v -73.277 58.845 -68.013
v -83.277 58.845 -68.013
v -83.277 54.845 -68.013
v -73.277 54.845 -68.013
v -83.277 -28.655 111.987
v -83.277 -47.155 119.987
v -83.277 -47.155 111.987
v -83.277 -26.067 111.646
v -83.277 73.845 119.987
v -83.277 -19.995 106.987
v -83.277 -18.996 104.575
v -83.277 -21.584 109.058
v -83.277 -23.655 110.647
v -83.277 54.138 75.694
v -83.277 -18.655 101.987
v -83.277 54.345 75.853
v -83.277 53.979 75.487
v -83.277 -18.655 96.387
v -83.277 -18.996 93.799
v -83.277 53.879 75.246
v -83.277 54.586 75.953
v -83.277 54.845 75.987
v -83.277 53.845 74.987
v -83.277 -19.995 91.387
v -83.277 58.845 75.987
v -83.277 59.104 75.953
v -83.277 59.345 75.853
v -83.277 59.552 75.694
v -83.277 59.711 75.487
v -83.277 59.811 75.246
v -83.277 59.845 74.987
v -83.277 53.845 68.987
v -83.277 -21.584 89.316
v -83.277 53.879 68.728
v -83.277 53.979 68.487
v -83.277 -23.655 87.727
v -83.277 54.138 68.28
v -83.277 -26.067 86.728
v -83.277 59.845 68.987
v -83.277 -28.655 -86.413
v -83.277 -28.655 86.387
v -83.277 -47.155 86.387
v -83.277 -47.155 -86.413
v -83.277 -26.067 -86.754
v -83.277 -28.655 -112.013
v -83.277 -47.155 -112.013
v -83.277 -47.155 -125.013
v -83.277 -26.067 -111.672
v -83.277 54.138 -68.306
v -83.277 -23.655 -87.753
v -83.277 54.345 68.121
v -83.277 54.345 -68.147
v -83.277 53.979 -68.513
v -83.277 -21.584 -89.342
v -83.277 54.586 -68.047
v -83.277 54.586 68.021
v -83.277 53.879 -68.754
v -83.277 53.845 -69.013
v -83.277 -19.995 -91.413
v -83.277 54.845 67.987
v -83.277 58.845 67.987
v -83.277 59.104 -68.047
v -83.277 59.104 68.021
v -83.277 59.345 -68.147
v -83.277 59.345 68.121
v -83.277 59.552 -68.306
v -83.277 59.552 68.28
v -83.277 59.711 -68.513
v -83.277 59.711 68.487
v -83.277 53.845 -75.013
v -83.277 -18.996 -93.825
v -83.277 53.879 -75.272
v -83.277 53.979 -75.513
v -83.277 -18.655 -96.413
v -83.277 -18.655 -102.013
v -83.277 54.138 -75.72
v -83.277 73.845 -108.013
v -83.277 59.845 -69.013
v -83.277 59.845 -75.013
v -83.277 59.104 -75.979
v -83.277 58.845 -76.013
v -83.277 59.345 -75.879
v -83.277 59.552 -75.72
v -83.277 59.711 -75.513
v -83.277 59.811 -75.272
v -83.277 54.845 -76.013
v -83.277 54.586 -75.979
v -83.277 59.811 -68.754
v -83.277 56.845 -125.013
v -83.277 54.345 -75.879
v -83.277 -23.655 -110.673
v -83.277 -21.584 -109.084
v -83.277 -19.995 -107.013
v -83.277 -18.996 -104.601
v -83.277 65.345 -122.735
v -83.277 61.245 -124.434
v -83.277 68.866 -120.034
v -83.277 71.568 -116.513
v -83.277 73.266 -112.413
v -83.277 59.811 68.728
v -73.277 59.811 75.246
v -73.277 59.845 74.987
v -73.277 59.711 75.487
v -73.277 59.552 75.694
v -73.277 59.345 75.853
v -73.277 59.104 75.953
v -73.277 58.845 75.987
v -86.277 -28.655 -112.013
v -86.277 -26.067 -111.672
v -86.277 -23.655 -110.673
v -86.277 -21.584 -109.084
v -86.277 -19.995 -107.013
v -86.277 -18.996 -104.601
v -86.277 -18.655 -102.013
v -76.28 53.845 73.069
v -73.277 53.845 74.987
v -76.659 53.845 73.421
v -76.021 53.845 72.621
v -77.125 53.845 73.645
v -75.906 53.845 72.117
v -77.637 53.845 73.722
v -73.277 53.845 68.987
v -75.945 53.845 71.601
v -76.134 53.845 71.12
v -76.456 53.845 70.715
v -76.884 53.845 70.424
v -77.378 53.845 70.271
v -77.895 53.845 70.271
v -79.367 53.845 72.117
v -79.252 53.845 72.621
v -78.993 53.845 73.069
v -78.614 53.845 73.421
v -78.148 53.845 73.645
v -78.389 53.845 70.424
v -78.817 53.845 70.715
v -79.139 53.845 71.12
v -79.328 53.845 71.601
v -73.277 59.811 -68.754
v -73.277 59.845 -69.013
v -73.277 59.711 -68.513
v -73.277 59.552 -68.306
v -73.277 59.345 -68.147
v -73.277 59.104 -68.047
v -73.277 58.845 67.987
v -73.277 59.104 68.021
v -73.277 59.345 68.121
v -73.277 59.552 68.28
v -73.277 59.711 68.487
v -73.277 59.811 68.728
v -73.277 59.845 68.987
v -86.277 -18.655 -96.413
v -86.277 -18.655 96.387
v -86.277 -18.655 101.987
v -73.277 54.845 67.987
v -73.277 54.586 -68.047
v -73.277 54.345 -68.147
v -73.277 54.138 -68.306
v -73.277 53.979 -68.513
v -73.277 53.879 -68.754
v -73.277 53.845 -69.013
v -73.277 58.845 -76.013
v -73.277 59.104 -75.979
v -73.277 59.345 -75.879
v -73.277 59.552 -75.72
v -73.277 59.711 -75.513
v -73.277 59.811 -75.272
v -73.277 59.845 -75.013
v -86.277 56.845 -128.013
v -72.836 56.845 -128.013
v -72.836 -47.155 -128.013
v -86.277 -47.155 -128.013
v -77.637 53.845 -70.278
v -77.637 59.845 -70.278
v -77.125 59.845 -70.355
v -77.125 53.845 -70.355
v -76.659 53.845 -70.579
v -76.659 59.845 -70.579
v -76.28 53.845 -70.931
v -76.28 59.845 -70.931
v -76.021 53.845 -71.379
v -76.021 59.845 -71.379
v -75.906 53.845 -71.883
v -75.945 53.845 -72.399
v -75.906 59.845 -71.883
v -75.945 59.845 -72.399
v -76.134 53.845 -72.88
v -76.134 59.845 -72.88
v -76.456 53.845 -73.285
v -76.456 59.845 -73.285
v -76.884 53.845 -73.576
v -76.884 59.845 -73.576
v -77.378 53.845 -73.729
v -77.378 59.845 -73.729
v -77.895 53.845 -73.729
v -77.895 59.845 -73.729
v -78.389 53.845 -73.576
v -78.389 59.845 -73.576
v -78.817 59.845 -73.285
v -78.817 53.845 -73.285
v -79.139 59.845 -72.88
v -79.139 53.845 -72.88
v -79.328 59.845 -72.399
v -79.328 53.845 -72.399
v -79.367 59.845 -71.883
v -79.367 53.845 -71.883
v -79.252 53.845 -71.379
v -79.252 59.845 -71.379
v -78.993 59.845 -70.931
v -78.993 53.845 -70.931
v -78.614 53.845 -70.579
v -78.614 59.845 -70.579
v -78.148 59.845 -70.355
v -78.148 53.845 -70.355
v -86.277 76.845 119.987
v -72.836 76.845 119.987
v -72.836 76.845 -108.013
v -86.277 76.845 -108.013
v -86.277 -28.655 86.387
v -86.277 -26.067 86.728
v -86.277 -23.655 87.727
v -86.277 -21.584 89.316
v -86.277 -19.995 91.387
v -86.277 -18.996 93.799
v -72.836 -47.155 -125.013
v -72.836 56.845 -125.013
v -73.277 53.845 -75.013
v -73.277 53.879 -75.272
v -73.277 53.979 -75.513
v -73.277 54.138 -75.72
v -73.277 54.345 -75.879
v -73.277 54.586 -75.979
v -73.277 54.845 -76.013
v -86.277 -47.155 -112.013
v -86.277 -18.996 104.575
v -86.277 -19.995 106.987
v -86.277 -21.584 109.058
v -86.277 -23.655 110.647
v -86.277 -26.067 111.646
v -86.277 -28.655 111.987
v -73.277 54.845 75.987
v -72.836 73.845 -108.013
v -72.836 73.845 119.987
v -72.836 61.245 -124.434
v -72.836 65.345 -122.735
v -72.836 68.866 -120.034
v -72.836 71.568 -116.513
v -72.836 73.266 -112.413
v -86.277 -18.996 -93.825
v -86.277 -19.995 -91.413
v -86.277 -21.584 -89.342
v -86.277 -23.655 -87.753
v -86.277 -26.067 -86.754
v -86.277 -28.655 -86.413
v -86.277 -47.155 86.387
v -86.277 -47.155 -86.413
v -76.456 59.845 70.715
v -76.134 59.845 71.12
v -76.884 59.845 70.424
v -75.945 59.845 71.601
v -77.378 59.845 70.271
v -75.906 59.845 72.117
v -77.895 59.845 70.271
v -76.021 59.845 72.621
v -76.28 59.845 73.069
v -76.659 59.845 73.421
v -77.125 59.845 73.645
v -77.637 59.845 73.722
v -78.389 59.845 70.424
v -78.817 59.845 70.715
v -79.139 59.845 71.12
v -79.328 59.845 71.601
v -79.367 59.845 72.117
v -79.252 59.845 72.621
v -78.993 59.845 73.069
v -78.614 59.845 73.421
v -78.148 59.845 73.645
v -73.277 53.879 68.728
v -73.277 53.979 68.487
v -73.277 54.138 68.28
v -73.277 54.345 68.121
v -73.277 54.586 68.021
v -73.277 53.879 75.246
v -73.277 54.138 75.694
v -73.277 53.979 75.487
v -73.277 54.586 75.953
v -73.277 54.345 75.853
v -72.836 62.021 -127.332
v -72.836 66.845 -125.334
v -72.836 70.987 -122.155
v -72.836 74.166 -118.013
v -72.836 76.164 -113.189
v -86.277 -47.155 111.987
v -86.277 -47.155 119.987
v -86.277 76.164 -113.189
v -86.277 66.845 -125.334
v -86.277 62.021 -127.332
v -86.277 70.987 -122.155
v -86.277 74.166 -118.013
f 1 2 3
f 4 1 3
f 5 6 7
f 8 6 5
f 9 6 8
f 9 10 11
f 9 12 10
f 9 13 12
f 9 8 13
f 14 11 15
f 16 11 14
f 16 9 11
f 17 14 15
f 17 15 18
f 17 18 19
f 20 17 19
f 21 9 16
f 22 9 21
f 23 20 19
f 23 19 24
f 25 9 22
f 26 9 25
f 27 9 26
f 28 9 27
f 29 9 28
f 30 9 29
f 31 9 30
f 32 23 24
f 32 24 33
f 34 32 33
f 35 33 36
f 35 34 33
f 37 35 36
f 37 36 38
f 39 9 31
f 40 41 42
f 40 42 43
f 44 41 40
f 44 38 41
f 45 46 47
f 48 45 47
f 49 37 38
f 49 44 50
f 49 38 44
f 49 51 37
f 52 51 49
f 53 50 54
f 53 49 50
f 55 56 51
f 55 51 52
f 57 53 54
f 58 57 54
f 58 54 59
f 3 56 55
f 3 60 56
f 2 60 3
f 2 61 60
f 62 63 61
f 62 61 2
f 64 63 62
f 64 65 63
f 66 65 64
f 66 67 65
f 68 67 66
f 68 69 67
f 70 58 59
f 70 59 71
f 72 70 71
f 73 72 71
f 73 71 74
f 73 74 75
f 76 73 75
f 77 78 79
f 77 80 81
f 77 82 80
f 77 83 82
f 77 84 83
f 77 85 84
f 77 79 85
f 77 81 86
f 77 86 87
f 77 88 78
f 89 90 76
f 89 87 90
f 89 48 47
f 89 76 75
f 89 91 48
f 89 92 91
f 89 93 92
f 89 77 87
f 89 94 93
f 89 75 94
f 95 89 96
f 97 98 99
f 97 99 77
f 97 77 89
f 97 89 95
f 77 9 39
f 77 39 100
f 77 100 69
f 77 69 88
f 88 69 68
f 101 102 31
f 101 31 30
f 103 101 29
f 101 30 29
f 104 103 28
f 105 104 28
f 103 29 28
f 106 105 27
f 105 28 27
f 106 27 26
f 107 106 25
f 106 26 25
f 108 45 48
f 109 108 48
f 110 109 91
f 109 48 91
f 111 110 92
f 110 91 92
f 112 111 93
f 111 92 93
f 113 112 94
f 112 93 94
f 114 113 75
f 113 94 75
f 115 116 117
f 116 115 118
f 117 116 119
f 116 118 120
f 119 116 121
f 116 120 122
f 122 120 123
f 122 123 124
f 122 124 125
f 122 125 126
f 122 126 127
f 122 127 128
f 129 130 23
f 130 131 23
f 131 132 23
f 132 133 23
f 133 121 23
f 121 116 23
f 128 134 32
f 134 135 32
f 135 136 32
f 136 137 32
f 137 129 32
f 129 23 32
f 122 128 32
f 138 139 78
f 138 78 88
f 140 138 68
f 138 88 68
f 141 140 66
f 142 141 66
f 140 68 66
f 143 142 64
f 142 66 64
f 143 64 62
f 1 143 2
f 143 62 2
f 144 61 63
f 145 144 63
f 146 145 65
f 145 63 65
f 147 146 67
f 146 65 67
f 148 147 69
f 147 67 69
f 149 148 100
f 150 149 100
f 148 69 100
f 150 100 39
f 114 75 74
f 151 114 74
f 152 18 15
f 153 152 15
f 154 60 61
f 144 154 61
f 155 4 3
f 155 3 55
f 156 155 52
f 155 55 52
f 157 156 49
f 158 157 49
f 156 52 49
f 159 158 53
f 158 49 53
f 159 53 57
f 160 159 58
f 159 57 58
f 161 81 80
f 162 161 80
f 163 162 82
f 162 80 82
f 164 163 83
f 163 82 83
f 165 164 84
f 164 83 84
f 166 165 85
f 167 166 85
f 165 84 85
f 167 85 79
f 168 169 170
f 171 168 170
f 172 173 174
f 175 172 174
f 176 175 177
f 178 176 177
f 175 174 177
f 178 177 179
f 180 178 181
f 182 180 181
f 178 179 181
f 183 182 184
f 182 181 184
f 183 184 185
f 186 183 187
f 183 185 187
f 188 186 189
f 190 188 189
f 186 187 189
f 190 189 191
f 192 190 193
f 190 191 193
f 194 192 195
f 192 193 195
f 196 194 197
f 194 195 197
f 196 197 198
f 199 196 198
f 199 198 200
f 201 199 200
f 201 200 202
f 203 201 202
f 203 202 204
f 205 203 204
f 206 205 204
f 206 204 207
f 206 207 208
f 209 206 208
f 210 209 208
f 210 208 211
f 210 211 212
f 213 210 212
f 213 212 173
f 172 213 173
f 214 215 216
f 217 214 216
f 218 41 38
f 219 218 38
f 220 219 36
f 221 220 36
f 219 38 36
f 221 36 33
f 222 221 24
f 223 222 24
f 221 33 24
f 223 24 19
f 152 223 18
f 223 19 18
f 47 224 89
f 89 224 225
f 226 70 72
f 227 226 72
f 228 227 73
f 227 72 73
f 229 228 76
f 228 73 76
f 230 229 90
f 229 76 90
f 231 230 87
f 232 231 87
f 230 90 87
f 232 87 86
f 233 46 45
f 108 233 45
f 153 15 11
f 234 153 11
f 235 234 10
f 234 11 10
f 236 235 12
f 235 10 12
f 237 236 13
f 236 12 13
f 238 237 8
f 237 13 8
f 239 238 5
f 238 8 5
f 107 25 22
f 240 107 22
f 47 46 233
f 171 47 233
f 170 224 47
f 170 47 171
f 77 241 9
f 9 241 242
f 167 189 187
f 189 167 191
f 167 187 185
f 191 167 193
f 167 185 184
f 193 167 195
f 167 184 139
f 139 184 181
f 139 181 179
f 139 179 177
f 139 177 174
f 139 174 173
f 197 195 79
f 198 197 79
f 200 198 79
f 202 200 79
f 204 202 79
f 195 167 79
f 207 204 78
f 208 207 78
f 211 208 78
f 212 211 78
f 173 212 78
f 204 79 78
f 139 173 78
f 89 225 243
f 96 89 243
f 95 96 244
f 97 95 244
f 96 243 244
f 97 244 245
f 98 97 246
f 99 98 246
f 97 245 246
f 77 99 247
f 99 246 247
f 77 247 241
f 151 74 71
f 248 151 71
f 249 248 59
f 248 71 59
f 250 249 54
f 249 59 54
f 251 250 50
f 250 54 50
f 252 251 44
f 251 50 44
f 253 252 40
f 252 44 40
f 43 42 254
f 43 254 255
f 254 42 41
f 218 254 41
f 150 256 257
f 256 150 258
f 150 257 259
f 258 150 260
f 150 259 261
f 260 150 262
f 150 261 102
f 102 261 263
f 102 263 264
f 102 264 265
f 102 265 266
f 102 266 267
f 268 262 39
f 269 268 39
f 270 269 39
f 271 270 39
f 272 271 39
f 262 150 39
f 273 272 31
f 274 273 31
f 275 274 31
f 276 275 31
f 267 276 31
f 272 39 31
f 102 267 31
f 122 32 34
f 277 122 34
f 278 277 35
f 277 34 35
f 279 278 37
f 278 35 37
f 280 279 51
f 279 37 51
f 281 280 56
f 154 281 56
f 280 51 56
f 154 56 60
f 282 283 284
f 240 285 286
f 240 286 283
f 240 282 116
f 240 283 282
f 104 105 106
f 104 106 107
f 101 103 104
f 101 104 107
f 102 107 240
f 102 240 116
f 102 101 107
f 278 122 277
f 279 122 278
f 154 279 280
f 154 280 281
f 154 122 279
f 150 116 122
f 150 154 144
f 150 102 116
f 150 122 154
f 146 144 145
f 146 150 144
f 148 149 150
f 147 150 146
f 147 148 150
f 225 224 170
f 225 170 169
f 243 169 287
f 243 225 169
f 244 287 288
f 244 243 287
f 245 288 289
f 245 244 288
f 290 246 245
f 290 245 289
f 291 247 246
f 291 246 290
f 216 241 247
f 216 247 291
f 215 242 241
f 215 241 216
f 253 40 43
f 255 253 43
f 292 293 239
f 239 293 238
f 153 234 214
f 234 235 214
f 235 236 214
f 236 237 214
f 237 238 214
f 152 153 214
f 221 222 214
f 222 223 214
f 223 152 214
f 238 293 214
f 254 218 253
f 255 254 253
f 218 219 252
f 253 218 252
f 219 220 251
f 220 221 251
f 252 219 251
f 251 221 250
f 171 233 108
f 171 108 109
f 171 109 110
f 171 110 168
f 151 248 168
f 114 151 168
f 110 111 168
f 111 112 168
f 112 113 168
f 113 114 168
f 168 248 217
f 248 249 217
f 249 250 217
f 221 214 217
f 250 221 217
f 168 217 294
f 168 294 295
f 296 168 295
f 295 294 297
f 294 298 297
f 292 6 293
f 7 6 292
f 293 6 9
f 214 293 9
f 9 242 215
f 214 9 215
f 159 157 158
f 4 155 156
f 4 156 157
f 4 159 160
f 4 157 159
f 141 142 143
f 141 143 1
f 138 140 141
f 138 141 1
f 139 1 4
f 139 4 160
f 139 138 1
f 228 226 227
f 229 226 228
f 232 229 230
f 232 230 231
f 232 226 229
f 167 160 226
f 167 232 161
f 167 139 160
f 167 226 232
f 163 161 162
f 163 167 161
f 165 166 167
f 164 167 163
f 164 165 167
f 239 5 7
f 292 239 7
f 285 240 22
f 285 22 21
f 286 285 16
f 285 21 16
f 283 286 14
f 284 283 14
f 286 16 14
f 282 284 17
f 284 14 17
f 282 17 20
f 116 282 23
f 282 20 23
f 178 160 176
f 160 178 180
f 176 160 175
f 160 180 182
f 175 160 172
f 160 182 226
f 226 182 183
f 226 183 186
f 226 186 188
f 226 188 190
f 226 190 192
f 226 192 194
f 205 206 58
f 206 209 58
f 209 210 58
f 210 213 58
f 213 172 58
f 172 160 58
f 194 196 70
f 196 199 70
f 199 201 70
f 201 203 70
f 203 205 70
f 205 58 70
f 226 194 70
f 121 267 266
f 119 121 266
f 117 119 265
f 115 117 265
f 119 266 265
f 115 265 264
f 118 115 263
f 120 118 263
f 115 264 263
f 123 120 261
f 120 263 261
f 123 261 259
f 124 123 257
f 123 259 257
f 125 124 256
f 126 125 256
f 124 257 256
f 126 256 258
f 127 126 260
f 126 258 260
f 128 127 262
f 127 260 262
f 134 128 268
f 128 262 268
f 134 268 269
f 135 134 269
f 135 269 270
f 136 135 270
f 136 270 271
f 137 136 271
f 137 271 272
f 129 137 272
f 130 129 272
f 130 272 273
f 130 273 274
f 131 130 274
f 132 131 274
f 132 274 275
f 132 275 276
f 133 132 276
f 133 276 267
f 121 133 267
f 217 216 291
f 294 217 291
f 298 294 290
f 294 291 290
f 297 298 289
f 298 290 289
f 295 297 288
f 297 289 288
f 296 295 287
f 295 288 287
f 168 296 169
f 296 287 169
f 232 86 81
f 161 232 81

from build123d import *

# Parameters (mm, degrees)
SKETCH1_R             = 10
BOSS_EXTRUDE1_DEPTH   = 3
BOSS_EXTRUDE2_DEPTH   = 10
BOSS_EXTRUDE2_2_DEPTH = 10
BOSS_EXTRUDE3_DEPTH   = 3
SKETCH6_W             = 3
SKETCH6_H             = 253
BOSS_EXTRUDE4_DEPTH   = 159
BOSS_EXTRUDE6_DEPTH   = 10
SKETCH9_R             = 1.735
CUT_EXTRUDE3_DEPTH    = 10
BOSS_EXTRUDE7_DEPTH   = 80.27650967
CUT_EXTRUDE6_DEPTH    = 143
SKETCH14_W            = 253
SKETCH14_H            = 35
CUT_EXTRUDE7_DEPTH    = 143
CUT_EXTRUDE8_DEPTH    = 143
SKETCH17_R            = 2.5
CUT_EXTRUDE9_DEPTH    = 143
SKETCH18_W            = 12.581611653
SKETCH18_H            = 132.027792725
CUT_EXTRUDE10_DEPTH   = 143
SKETCH29_W            = 88.113599476
SKETCH29_H            = 135.236918358
CUT_EXTRUDE19_DEPTH   = 150


with BuildPart() as part:
    # Sketch1 → Boss-Extrude1 (new body)
    with BuildSketch(Plane(origin=(0, 0, 0), x_dir=(0, 0, -1), z_dir=(1, 0, 0))):
        with BuildLine():
            Line((-77.887006237, -82.154885655), (77.912993763, -82.154885655))
            Line((77.912993763, -82.154885655), (77.912993763, -78.154885655))
            ThreePointArc((77.912993763, -78.154885655), (86.412993763, -69.654885655), (94.912993763, -78.154885655))
            Line((94.912993763, -78.154885655), (94.912993763, -82.154885655))
            Line((94.912993763, -82.154885655), (125.012993763, -82.154885655))
            Line((125.012993763, -82.154885655), (125.012993763, 51.845114345))
            Line((125.012993763, 51.845114345), (-124.987006237, 51.845114345))
            Line((-124.987006237, 51.845114345), (-124.987006237, -82.154885655))
            Line((-124.987006237, -82.154885655), (-94.887006237, -82.154885655))
            Line((-94.887006237, -82.154885655), (-94.887006237, -78.154885655))
            ThreePointArc((-94.887006237, -78.154885655), (-86.387006237, -69.654885655), (-77.887006237, -78.154885655))
            Line((-77.887006237, -78.154885655), (-77.887006237, -82.154885655))
        make_face()
        with Locations((-101.987006237, -28.654885655)):
            Circle(SKETCH1_R, mode=Mode.SUBTRACT)
        with Locations(Location((102.012993763, -28.654885655, 0), (0, 0, 180))):
            Circle(SKETCH1_R, mode=Mode.SUBTRACT)
    extrude(amount=-BOSS_EXTRUDE1_DEPTH)

    # Sketch5 → Boss-Extrude3 (add)
    with BuildSketch(Plane(origin=(0, 0, 0), x_dir=(0, 0, -1), z_dir=(1, 0, 0))):
        with BuildLine():
            Line((-124.987006237, 76.845114345), (-124.987006237, 51.845114345))
            Line((-124.987006237, 51.845114345), (125.012993763, 51.845114345))
            Line((125.012993763, 51.845114345), (125.012993763, -82.154885655))
            Line((125.012993763, -82.154885655), (128.012993763, -82.154885655))
            Line((128.012993763, -82.154885655), (128.012993763, 56.845114345))
            ThreePointArc((128.012993763, 56.845114345), (122.155129387, 70.987249969), (108.012993763, 76.845114345))
            Line((108.012993763, 76.845114345), (-124.987006237, 76.845114345))
        make_face()
    extrude(amount=-BOSS_EXTRUDE3_DEPTH)



with BuildPart() as body_2:
    # Sketch2 → Boss-Extrude2 (new body)
    with BuildSketch(Plane.ZY.offset(3)):
        with BuildLine():
            Line((-75.012993763, 59.845114345), (-69.012993763, 59.845114345))
            ThreePointArc((-69.012993763, 59.845114345), (-68.305886982, 59.552221126), (-68.012993763, 58.845114345))
            Line((-68.012993763, 58.845114345), (-68.012993763, 54.845114345))
            ThreePointArc((-68.012993763, 54.845114345), (-68.305886982, 54.138007564), (-69.012993763, 53.845114345))
            Line((-69.012993763, 53.845114345), (-75.012993763, 53.845114345))
            ThreePointArc((-75.012993763, 53.845114345), (-75.720100544, 54.138007564), (-76.012993763, 54.845114345))
            Line((-76.012993763, 54.845114345), (-76.012993763, 58.845114345))
            ThreePointArc((-76.012993763, 58.845114345), (-75.720100544, 59.552221126), (-75.012993763, 59.845114345))
        make_face()
    extrude(amount=BOSS_EXTRUDE2_DEPTH)


with BuildPart() as body_3:
    # Sketch2 → Boss-Extrude2 2 (new body)
    with BuildSketch(Plane.ZY.offset(3)):
        with BuildLine():
            Line((67.987006237, 58.845114345), (67.987006237, 54.845114345))
            ThreePointArc((67.987006237, 54.845114345), (68.279899456, 54.138007564), (68.987006237, 53.845114345))
            Line((68.987006237, 53.845114345), (74.987006237, 53.845114345))
            ThreePointArc((74.987006237, 53.845114345), (75.694113018, 54.138007564), (75.987006237, 54.845114345))
            Line((75.987006237, 54.845114345), (75.987006237, 58.845114345))
            ThreePointArc((75.987006237, 58.845114345), (75.694113018, 59.552221126), (74.987006237, 59.845114345))
            Line((74.987006237, 59.845114345), (68.987006237, 59.845114345))
            ThreePointArc((68.987006237, 59.845114345), (68.279899456, 59.552221126), (67.987006237, 58.845114345))
        make_face()
    extrude(amount=BOSS_EXTRUDE2_2_DEPTH)


with BuildPart() as body_4:
    # Sketch6 → Boss-Extrude4 (new body)
    with BuildSketch(Plane(origin=(0, 76.845114345, 0), x_dir=(1, 0, 0), z_dir=(0, 1, 0))):
        with Locations((-84.77650967, 1.512993763)):
            Rectangle(SKETCH6_W, SKETCH6_H)
    extrude(amount=-BOSS_EXTRUDE4_DEPTH)

    # Sketch8 → Boss-Extrude6 (add)
    with BuildSketch(Plane.ZY.offset(83.27650967)):
        with BuildLine():
            Line((-75.012993763, 59.845114345), (-69.012993763, 59.845114345))
            ThreePointArc((-69.012993763, 59.845114345), (-68.305886982, 59.552221126), (-68.012993763, 58.845114345))
            Line((-68.012993763, 58.845114345), (-68.012993763, 54.845114345))
            ThreePointArc((-68.012993763, 54.845114345), (-68.305886982, 54.138007564), (-69.012993763, 53.845114345))
            Line((-69.012993763, 53.845114345), (-75.012993763, 53.845114345))
            ThreePointArc((-75.012993763, 53.845114345), (-75.720100544, 54.138007564), (-76.012993763, 54.845114345))
            Line((-76.012993763, 54.845114345), (-76.012993763, 58.845114345))
            ThreePointArc((-76.012993763, 58.845114345), (-75.720100544, 59.552221126), (-75.012993763, 59.845114345))
        make_face()
        with BuildLine():
            Line((68.987006237, 59.845114345), (74.987006237, 59.845114345))
            ThreePointArc((74.987006237, 59.845114345), (75.694113018, 59.552221126), (75.987006237, 58.845114345))
            Line((75.987006237, 58.845114345), (75.987006237, 54.845114345))
            ThreePointArc((75.987006237, 54.845114345), (75.694113018, 54.138007564), (74.987006237, 53.845114345))
            Line((74.987006237, 53.845114345), (68.987006237, 53.845114345))
            ThreePointArc((68.987006237, 53.845114345), (68.279899456, 54.138007564), (67.987006237, 54.845114345))
            Line((67.987006237, 54.845114345), (67.987006237, 58.845114345))
            ThreePointArc((67.987006237, 58.845114345), (68.279899456, 59.552221126), (68.987006237, 59.845114345))
        make_face()
    extrude(amount=-BOSS_EXTRUDE6_DEPTH)


with BuildPart() as cut_extrude3_tool:
    # Sketch9 → Cut-Extrude3 (new body)
    with BuildSketch(Plane(origin=(0, 59.845114345, 0), x_dir=(1, 0, 0), z_dir=(0, 1, 0))):
        with Locations(Location((-77.63650967, -71.987006237, 0), (0, 0, 270))):
            Circle(SKETCH9_R)
        with Locations(Location((-77.63650967, 72.012993763, 0), (0, 0, 270))):
            Circle(SKETCH9_R)
        with Locations(Location((-8.64, -71.987006237, 0), (0, 0, 270))):
            Circle(SKETCH9_R)
        with Locations(Location((-8.64, 72.012993763, 0), (0, 0, 270))):
            Circle(SKETCH9_R)
    extrude(amount=-CUT_EXTRUDE3_DEPTH)


with BuildPart() as body_2_1:
    add(body_2.part)

    # Cut-Extrude3: cut by cut_extrude3_tool
    add(cut_extrude3_tool.part, mode=Mode.SUBTRACT)


with BuildPart() as body_3_1:
    add(body_3.part)

    # Cut-Extrude3: cut by cut_extrude3_tool
    add(cut_extrude3_tool.part, mode=Mode.SUBTRACT)


with BuildPart() as body_4_1:
    add(body_4.part)

    # Cut-Extrude3: cut by cut_extrude3_tool
    add(cut_extrude3_tool.part, mode=Mode.SUBTRACT)


with BuildPart() as part_1:
    add(part.part)

    add(body_4_1.part)  # Boss-Extrude7 merges body 4
    # Sketch11 → Boss-Extrude7 (add)
    with BuildSketch(Plane.ZY.offset(3)):
        with BuildLine():
            Line((124.987006237, 73.845114345), (124.987006237, 76.845114345))
            Line((124.987006237, 76.845114345), (-108.012993763, 76.845114345))
            ThreePointArc((-108.012993763, 76.845114345), (-122.155129387, 70.987249969), (-128.012993763, 56.845114345))
            Line((-128.012993763, 56.845114345), (-128.012993763, -82.154885655))
            Line((-128.012993763, -82.154885655), (-125.012993763, -82.154885655))
            Line((-125.012993763, -82.154885655), (-125.012993763, 56.845114345))
            ThreePointArc((-125.012993763, 56.845114345), (-120.033809043, 68.865929625), (-108.012993763, 73.845114345))
            Line((-108.012993763, 73.845114345), (124.987006237, 73.845114345))
        make_face()
    extrude(amount=BOSS_EXTRUDE7_DEPTH)

    # Sketch13 → Cut-Extrude6 (cut)
    with BuildSketch(Plane(origin=(0, 0, 0), x_dir=(0, 0, -1), z_dir=(1, 0, 0))):
        with BuildLine():
            Line((-111.987006237, -28.654885655), (-111.987006237, -82.154885655))
            Line((-111.987006237, -82.154885655), (-77.887006237, -82.154885655))
            Line((-77.887006237, -82.154885655), (-77.887006237, -78.154885655))
            ThreePointArc((-77.887006237, -78.154885655), (-80.376598597, -72.144478015), (-86.387006237, -69.654885655))
            Line((-86.387006237, -69.654885655), (-86.387006237, -28.654885655))
            ThreePointArc((-86.387006237, -28.654885655), (-89.315938425, -21.583817843), (-96.387006237, -18.654885655))
            Line((-96.387006237, -18.654885655), (-101.987006237, -18.654885655))
            ThreePointArc((-101.987006237, -18.654885655), (-109.058074049, -21.583817843), (-111.987006237, -28.654885655))
        make_face()
        with BuildLine():
            Line((112.012993763, -82.154885655), (112.012993763, -28.654885655))
            ThreePointArc((112.012993763, -28.654885655), (109.084061575, -21.583817843), (102.012993763, -18.654885655))
            Line((102.012993763, -18.654885655), (96.412993763, -18.654885655))
            ThreePointArc((96.412993763, -18.654885655), (89.341925951, -21.583817843), (86.412993763, -28.654885655))
            Line((86.412993763, -28.654885655), (86.412993763, -69.654885655))
            ThreePointArc((86.412993763, -69.654885655), (80.402586123, -72.144478015), (77.912993763, -78.154885655))
            Line((77.912993763, -78.154885655), (77.912993763, -82.154885655))
            Line((77.912993763, -82.154885655), (112.012993763, -82.154885655))
        make_face()
    extrude(amount=-CUT_EXTRUDE6_DEPTH, mode=Mode.SUBTRACT)

    # Sketch14 → Cut-Extrude7 (cut)
    with BuildSketch(Plane(origin=(0, 0, 0), x_dir=(0, 0, -1), z_dir=(1, 0, 0))):
        with Locations((1.512993763, -64.654885655)):
            Rectangle(SKETCH14_W, SKETCH14_H)
    extrude(amount=-CUT_EXTRUDE7_DEPTH, mode=Mode.SUBTRACT)

    # Sketch15 → Cut-Extrude8 (cut)
    with BuildSketch(Plane(origin=(0, 0, 0), x_dir=(0, 0, -1), z_dir=(1, 0, 0))):
        with BuildLine():
            Line((108.012993763, 76.845114345), (128.012993763, 76.845114345))
            Line((128.012993763, 76.845114345), (128.012993763, 56.845114345))
            ThreePointArc((128.012993763, 56.845114345), (122.155129387, 70.987249969), (108.012993763, 76.845114345))
        make_face()
    extrude(amount=-CUT_EXTRUDE8_DEPTH, mode=Mode.SUBTRACT)

    # Sketch17 → Cut-Extrude9 (cut)
    with BuildSketch(Plane(origin=(0, 76.845114345, 0), x_dir=(1, 0, 0), z_dir=(0, 1, 0))):
        with Locations(Location((-43.138761, -96.337006347, 0), (0, 0, 270))):
            Circle(SKETCH17_R)
    extrude(amount=-CUT_EXTRUDE9_DEPTH, mode=Mode.SUBTRACT)

    # Sketch18 → Cut-Extrude10 (cut)
    with BuildSketch(Plane(origin=(0, 0, 0), x_dir=(0, 0, -1), z_dir=(1, 0, 0))):
        with Locations((-126.277812064, 15.020453299)):
            Rectangle(SKETCH18_W, SKETCH18_H)
    extrude(amount=-CUT_EXTRUDE10_DEPTH, mode=Mode.SUBTRACT)


with BuildPart() as cut_extrude19_tool:
    # Sketch29 → Cut-Extrude19 (new, symmetric)
    with BuildSketch(Plane.XY):
        with Locations((-28.779229361, 13.195273746)):
            Rectangle(SKETCH29_W, SKETCH29_H)
    extrude(amount=CUT_EXTRUDE19_DEPTH, both=True)


with BuildPart() as part_2:
    add(part_1.part)

    # Cut-Extrude19: cut by cut_extrude19_tool
    add(cut_extrude19_tool.part, mode=Mode.SUBTRACT)


with BuildPart() as body_2_2:
    add(body_2_1.part)

    # Cut-Extrude19: cut by cut_extrude19_tool
    add(cut_extrude19_tool.part, mode=Mode.SUBTRACT)


with BuildPart() as body_3_2:
    add(body_3_1.part)

    # Cut-Extrude19: cut by cut_extrude19_tool
    add(cut_extrude19_tool.part, mode=Mode.SUBTRACT)


solid = part_2.part
